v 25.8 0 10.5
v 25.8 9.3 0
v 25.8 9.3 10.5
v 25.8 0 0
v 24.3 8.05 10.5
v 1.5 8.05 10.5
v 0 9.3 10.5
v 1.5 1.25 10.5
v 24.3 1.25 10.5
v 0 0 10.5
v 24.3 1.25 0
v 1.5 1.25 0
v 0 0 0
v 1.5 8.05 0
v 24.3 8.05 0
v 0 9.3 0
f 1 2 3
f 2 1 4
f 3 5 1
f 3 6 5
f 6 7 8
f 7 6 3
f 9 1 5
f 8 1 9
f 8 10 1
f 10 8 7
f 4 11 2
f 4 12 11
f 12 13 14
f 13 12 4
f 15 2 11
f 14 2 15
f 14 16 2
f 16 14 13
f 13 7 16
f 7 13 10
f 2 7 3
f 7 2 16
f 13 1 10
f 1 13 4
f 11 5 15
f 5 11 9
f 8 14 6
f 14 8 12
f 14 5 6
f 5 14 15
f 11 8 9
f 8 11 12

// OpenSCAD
/* [Configuration ] */
//Length
l=25.8;
//Breadth
b=9.3;
//Width
w=10.5;
//Length thickness of walls
lt=1.5;
//Breadth thickness of walls
bt=1.25;

/* [Text] */
//Text
text="";
//Text Size
TS=5;
//https://www.google.com/fonts [eg Liberation Sans:style=Bold Italic]
FONT="Times New Roman";

/* [Advanced Text] */
// Text Spacing
space=1;
//Text Stretch X
tx=1;
//Text Stretch Y
ty=1;
//Text Rotation[in degrees]
tr=0;
//text x offset
txo=0;
//text y offset
tyo=0;

/* [Expiermental] */
//Text Tiwst
tt=0;
//Resolution of file
$fn = 200;
//Vertical Text Alignment
VA="center";// Eg left, right, center, or any number
//Horizontal Text Alignment
HA="center";//Eg top, center, bottom, baseline, or any number

difference(){

difference(){
    cube([l,b,w]);
    translate([lt,bt,-0.1]){
    cube([l-lt*2,b-bt*2,w+0.2]);
    }
}

//TEXT
translate([l/2+txo,lt-0.1,w/2+tyo]){
rotate([90,tr,0]){
linear_extrude(height=lt,twist=tt){
scale([tx,ty,1]){
text(text,TS,FONT,halign=HA ,valign=VA,spacing=space);
    }
}
}
}

}
